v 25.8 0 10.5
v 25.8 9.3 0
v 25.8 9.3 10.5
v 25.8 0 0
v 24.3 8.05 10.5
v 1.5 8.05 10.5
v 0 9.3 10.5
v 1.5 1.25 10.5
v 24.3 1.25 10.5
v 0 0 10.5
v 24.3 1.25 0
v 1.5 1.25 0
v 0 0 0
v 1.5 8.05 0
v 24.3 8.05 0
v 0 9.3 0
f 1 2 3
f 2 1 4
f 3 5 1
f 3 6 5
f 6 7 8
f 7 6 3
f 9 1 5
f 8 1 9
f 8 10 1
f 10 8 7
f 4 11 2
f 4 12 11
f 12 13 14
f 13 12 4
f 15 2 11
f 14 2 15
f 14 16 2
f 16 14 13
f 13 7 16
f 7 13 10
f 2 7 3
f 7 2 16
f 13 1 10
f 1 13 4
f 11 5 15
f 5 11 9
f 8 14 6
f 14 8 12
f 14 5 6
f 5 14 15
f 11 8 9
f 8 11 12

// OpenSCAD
/* [Configuration ] */
//Length
l=25.8;
//Breadth
b=9.3;
//Width
w=10.5;
//Length thickness of walls
lt=1.5;
//Breadth thickness of walls
bt=1.25;

/* [Text] */
//Text
text="";
//Text Size
TS=5;
//https://www.google.com/fonts [eg Liberation Sans:style=Bold Italic]
FONT="Times New Roman";

/* [Advanced Text] */
// Text Spacing
space=1;
//Text Stretch X
tx=1;
//Text Stretch Y
ty=1;
//Text Rotation[in degrees]
tr=0;
//text x offset
txo=0;
//text y offset
tyo=0;

/* [Expiermental] */
//Text Tiwst
tt=0;
//Resolution of file
$fn = 200;
//Vertical Text Alignment
VA="center";// Eg left, right, center, or any number
//Horizontal Text Alignment
HA="center";//Eg top, center, bottom, baseline, or any number

difference(){

difference(){
    cube([l,b,w]);
    translate([lt,bt,-0.1]){
    cube([l-lt*2,b-bt*2,w+0.2]);
    }
}

//TEXT
translate([l/2+txo,lt-0.1,w/2+tyo]){
rotate([90,tr,0]){
linear_extrude(height=lt,twist=tt){
scale([tx,ty,1]){
text(text,TS,FONT,halign=HA ,valign=VA,spacing=space);
    }
}
}
}

}
